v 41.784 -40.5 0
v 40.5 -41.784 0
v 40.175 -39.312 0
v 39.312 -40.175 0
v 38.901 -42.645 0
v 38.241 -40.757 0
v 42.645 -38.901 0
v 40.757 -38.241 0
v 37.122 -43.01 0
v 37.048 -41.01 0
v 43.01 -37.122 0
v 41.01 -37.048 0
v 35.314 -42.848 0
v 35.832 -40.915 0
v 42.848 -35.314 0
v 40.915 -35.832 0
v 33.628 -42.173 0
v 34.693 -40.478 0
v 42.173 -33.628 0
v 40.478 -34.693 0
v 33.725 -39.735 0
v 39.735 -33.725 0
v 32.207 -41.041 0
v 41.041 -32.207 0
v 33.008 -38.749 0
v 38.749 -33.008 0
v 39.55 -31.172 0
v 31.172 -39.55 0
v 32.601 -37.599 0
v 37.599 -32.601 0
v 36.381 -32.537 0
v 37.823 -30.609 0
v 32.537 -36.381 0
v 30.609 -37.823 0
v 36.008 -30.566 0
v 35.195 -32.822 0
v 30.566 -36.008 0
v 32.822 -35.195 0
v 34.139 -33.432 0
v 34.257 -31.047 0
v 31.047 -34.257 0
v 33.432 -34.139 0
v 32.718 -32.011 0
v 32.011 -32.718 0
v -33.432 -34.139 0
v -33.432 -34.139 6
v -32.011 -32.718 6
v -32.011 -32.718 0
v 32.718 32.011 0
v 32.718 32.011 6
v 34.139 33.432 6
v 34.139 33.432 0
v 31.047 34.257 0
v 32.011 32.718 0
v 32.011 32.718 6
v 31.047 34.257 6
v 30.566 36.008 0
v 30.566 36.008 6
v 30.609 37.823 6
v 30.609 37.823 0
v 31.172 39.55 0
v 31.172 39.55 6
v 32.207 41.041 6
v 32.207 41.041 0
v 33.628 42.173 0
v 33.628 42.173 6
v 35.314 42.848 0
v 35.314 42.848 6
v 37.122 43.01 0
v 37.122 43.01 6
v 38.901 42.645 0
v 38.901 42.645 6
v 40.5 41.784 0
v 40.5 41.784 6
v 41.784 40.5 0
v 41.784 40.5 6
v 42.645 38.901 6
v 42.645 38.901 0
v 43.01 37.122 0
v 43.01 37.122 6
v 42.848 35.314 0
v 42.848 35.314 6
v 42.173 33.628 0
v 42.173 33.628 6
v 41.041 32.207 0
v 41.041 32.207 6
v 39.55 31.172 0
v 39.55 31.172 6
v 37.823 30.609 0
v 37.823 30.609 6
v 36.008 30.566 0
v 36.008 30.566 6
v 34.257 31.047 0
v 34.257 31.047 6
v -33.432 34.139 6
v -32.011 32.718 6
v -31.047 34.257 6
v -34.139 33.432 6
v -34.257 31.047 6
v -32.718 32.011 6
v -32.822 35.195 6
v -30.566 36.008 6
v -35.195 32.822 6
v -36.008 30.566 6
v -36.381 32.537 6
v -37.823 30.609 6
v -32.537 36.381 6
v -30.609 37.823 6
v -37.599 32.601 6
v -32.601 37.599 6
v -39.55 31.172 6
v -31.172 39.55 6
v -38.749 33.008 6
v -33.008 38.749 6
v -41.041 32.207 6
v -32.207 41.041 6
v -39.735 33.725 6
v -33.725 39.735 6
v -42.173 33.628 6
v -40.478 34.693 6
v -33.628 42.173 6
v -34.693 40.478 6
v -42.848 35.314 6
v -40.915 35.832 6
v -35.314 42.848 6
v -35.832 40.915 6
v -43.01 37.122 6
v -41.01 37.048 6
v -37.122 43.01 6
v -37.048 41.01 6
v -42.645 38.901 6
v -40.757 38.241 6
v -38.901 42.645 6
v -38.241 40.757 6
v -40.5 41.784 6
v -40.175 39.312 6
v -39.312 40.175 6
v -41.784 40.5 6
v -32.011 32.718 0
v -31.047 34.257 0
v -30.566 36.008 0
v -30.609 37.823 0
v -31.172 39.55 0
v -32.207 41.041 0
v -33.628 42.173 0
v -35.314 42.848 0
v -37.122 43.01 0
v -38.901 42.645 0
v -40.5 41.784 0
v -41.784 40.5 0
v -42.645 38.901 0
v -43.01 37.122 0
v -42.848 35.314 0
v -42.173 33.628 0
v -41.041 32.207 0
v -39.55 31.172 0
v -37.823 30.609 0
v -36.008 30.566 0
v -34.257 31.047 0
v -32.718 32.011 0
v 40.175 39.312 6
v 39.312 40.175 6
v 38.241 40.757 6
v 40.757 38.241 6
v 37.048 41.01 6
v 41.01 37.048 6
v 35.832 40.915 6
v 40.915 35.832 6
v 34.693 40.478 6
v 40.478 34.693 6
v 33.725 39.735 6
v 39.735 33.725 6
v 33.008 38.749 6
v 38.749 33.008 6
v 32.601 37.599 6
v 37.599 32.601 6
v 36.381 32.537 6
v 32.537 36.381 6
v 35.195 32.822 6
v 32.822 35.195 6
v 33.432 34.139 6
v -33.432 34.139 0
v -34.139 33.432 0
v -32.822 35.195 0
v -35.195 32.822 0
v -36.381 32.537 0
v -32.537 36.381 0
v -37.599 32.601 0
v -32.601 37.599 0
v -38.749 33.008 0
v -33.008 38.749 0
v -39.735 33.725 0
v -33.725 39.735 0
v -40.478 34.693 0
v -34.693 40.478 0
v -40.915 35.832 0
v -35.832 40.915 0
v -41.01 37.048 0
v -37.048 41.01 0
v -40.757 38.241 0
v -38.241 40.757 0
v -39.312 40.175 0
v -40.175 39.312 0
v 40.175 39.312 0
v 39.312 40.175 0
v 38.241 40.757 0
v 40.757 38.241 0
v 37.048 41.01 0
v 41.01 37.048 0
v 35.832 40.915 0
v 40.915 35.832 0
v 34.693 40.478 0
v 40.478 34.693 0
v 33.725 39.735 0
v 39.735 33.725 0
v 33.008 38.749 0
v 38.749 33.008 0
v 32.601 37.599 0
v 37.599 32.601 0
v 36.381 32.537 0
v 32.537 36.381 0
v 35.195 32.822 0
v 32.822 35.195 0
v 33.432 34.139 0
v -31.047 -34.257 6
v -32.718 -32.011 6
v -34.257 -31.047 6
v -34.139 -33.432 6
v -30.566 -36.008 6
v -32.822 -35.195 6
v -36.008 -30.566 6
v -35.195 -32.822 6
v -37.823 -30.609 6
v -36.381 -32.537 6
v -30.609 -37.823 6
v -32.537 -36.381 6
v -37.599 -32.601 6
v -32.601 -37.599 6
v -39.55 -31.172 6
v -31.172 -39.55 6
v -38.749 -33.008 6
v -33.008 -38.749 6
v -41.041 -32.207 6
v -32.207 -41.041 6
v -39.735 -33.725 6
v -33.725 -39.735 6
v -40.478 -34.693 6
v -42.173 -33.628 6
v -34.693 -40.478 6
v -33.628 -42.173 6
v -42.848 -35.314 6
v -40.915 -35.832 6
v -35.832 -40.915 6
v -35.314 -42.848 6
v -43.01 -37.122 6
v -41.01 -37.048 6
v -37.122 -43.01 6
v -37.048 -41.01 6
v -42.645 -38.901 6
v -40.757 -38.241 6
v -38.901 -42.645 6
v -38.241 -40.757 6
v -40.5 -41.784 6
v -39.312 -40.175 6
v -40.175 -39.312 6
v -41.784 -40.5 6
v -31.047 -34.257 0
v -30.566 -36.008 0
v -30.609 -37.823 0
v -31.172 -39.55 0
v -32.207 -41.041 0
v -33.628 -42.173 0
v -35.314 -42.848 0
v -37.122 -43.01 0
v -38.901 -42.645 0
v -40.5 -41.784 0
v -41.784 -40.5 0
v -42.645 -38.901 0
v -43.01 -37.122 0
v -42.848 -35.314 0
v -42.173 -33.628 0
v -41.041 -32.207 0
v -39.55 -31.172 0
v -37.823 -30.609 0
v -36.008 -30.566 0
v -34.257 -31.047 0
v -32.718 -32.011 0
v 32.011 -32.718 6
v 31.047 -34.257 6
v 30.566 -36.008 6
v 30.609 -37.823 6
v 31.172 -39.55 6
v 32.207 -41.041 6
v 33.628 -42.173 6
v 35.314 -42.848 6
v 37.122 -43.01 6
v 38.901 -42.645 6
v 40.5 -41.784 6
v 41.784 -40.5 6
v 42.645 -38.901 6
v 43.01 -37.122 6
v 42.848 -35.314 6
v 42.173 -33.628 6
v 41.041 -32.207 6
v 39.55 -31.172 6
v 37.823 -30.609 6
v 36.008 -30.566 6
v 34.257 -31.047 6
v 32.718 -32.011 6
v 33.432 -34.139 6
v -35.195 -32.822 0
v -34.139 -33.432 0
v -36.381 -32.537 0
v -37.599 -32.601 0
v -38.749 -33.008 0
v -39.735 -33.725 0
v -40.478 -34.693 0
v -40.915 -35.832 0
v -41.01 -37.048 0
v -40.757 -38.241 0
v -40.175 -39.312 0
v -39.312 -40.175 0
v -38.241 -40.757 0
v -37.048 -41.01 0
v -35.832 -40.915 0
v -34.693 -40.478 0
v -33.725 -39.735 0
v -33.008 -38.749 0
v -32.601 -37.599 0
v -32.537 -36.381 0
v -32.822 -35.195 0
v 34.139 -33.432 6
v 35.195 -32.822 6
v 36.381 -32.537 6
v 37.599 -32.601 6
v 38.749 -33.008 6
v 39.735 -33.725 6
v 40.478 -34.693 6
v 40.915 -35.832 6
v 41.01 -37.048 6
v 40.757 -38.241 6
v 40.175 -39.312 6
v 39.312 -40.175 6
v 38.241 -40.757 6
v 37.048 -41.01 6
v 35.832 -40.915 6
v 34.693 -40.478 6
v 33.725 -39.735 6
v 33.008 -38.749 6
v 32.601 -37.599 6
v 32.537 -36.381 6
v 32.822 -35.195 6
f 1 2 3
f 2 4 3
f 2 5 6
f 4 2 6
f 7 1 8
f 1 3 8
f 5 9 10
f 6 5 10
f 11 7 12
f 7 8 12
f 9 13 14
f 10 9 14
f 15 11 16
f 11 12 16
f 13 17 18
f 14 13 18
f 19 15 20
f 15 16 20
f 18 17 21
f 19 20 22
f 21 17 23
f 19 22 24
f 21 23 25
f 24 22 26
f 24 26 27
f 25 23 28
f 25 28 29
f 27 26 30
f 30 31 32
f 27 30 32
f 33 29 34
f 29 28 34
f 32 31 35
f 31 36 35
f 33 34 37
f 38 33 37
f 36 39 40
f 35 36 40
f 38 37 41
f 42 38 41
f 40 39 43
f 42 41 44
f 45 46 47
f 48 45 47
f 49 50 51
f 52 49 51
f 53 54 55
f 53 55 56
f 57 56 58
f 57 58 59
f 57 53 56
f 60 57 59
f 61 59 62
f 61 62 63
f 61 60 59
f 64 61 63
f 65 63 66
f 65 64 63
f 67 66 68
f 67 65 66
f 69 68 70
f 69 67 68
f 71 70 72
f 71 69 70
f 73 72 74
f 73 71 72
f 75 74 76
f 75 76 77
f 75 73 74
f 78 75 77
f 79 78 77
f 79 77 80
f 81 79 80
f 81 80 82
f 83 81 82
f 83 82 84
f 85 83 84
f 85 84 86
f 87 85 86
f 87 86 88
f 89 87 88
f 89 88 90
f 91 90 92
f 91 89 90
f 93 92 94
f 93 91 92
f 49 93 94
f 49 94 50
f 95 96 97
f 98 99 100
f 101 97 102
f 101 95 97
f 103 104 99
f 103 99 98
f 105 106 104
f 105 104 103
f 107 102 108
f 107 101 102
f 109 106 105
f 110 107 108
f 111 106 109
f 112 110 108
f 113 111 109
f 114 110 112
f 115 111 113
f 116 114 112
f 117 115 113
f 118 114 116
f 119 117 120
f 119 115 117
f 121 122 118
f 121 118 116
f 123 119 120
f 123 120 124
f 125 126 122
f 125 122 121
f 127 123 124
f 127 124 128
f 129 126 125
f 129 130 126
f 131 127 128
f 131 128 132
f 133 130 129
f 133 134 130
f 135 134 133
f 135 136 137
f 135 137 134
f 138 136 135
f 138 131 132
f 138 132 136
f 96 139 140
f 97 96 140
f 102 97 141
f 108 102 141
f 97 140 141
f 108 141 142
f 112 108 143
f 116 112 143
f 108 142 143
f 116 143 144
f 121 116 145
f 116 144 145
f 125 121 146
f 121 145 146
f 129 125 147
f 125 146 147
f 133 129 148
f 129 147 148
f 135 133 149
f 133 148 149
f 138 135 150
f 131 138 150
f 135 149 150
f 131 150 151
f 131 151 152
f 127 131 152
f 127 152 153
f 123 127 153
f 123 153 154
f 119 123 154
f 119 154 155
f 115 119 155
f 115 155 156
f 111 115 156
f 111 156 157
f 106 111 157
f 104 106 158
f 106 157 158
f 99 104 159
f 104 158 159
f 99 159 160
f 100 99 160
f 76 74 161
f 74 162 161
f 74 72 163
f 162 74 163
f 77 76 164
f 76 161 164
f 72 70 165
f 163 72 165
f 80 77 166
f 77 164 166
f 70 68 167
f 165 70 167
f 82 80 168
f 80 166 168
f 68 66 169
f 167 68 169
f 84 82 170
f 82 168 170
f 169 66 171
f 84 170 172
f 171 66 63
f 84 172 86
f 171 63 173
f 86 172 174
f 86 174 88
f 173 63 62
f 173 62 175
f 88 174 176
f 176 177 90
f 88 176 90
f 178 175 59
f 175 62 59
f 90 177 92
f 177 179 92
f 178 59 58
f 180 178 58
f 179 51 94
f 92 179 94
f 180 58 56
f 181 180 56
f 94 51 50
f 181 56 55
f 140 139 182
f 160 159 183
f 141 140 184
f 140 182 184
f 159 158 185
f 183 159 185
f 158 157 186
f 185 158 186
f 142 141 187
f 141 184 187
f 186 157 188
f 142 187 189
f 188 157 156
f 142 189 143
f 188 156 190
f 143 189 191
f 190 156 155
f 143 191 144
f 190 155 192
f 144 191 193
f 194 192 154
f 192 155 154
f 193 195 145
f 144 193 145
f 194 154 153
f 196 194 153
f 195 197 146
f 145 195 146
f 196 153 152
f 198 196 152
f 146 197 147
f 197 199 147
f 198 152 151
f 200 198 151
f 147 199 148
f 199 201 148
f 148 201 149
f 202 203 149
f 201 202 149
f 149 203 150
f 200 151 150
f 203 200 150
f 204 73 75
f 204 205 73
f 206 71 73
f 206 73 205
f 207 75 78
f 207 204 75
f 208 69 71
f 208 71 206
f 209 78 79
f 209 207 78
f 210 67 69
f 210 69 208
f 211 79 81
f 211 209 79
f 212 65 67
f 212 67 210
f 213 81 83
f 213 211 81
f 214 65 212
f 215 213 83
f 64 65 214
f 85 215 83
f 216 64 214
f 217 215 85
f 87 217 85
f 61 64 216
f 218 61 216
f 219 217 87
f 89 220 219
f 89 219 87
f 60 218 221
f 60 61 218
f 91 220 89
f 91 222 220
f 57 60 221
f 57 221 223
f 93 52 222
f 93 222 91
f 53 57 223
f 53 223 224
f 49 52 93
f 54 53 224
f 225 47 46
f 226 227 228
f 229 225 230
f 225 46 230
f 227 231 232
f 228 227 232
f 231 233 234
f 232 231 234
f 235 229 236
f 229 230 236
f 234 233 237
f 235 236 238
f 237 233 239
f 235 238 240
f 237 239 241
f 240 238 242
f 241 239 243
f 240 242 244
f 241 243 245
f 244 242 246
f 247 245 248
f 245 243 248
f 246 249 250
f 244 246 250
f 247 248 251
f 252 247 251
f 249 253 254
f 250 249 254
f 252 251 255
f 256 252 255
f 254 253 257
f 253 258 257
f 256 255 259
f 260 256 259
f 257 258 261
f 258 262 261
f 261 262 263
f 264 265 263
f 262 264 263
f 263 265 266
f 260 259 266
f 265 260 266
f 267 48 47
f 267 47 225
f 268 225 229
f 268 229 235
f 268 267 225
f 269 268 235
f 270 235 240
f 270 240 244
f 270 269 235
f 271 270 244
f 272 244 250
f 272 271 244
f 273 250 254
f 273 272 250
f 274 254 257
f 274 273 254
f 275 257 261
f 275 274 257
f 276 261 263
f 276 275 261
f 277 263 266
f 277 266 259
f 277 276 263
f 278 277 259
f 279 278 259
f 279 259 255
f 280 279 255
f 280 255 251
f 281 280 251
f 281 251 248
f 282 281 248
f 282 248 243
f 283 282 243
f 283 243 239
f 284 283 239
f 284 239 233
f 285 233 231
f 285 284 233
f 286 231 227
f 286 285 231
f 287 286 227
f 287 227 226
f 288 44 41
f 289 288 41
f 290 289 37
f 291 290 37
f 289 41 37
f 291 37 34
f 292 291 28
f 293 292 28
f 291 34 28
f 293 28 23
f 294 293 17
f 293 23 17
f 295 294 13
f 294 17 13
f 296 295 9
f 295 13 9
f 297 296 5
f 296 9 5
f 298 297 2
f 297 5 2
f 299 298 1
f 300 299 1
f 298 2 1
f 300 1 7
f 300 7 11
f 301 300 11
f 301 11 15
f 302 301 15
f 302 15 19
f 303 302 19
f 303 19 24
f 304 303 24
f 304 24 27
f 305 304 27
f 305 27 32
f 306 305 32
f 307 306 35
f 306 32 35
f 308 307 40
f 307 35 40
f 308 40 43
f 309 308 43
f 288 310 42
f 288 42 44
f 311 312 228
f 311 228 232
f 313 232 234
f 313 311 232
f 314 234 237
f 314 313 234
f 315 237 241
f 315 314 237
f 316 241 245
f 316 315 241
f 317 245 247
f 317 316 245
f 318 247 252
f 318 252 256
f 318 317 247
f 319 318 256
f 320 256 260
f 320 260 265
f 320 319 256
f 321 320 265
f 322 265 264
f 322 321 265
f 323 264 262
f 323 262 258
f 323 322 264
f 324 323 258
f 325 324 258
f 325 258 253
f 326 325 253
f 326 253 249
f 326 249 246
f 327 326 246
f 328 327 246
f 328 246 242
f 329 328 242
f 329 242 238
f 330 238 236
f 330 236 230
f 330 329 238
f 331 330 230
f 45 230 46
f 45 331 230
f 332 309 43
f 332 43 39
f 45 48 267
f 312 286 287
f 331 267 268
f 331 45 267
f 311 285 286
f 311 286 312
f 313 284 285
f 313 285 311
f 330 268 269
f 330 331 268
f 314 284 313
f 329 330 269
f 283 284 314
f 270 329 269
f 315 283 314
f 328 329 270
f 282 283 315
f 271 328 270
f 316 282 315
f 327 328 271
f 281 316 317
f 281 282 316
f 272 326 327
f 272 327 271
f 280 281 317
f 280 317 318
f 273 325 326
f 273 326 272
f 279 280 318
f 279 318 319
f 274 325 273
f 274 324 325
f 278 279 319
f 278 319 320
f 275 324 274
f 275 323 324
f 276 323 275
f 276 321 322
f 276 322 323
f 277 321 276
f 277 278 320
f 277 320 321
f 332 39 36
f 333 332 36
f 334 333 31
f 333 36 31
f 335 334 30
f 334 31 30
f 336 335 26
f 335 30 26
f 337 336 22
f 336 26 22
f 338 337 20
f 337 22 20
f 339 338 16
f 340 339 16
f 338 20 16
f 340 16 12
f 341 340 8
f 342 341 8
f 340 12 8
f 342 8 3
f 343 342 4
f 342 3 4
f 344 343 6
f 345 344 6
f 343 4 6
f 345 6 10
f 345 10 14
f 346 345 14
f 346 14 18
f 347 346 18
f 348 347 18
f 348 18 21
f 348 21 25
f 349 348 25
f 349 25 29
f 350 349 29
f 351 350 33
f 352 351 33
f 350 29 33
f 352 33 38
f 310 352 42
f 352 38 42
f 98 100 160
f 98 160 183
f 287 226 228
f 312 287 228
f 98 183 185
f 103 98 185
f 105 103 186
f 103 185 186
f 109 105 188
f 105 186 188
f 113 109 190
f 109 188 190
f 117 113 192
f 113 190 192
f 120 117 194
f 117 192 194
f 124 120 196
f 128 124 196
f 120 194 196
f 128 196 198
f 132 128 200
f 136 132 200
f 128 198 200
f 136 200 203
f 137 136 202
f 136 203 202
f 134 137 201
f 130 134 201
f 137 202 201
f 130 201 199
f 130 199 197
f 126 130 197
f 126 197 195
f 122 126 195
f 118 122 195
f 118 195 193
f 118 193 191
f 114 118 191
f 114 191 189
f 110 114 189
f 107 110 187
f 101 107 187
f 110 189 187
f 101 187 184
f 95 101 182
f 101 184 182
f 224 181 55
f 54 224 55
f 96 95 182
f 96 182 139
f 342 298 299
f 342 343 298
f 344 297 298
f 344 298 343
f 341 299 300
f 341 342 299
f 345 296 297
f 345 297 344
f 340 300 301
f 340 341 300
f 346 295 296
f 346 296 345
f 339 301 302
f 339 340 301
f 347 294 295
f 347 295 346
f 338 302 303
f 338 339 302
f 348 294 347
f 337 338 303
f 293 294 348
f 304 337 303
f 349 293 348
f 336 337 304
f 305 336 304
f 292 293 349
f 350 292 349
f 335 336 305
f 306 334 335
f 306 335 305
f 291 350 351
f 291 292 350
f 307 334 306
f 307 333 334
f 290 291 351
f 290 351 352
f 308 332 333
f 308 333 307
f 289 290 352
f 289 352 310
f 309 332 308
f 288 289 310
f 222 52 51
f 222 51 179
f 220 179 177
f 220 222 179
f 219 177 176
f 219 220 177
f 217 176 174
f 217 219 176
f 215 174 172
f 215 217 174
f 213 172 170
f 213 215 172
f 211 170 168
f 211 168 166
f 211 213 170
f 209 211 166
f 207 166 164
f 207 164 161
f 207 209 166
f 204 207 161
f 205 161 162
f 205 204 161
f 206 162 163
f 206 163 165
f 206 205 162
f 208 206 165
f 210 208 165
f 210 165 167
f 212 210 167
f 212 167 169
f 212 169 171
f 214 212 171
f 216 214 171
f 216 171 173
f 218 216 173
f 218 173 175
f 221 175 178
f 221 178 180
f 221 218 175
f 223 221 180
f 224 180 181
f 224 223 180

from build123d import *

# Parameters (mm, degrees)
EXTRUDE_DEPTH    = 6
EXTRUDE001_DEPTH = 6
EXTRUDE002_DEPTH = 6
EXTRUDE003_DEPTH = 6


with BuildPart() as extrude_body:
    # Face → Extrude (new body)
    with BuildSketch(Plane(origin=(-36.885616, 36.885616, 0), x_dir=(0, 1, 0), z_dir=(0, 0, 1))):
        with BuildLine():
            Line((-2.746844, -3.453951), (-4.167763, -4.87487))
            ThreePointArc((-4.167763, -4.87487), (4.303354, 4.303354), (-4.87487, -4.167763))
            Line((-4.87487, -4.167763), (-3.453951, -2.746844))
            ThreePointArc((-3.453951, -2.746844), (2.88914, 2.88914), (-2.746844, -3.453951))
        make_face()
    extrude(amount=EXTRUDE_DEPTH)


with BuildPart() as extrude001:
    # Face001 → Extrude001 (new body)
    with BuildSketch(Plane(origin=(36.885616, 36.885616, 0), x_dir=(0, -1, 0), z_dir=(0, 0, -1))):
        with BuildLine():
            Line((2.746844, 3.453951), (4.167763, 4.87487))
            ThreePointArc((4.167763, 4.87487), (-4.303354, -4.303354), (4.87487, 4.167763))
            Line((4.87487, 4.167763), (3.453951, 2.746844))
            ThreePointArc((3.453951, 2.746844), (-2.88914, -2.88914), (2.746844, 3.453951))
        make_face()
    extrude(amount=-EXTRUDE001_DEPTH)


with BuildPart() as extrude002:
    # Face002 → Extrude002 (new body)
    with BuildSketch(Plane(origin=(36.885616, -36.885616, 0), x_dir=(0, 1, 0), z_dir=(0, 0, 1))):
        with BuildLine():
            Line((2.746844, 3.453951), (4.167763, 4.87487))
            ThreePointArc((4.167763, 4.87487), (-4.303354, -4.303354), (4.87487, 4.167763))
            Line((4.87487, 4.167763), (3.453951, 2.746844))
            ThreePointArc((3.453951, 2.746844), (-2.88914, -2.88914), (2.746844, 3.453951))
        make_face()
    extrude(amount=EXTRUDE002_DEPTH)


with BuildPart() as extrude003:
    # Face003 → Extrude003 (new body)
    with BuildSketch(Plane(origin=(-36.885616, -36.885616, 0), x_dir=(0, -1, 0), z_dir=(0, 0, -1))):
        with BuildLine():
            Line((-2.746844, -3.453951), (-4.167763, -4.87487))
            ThreePointArc((-4.167763, -4.87487), (4.303354, 4.303354), (-4.87487, -4.167763))
            Line((-4.87487, -4.167763), (-3.453951, -2.746844))
            ThreePointArc((-3.453951, -2.746844), (2.88914, 2.88914), (-2.746844, -3.453951))
        make_face()
    extrude(amount=-EXTRUDE003_DEPTH)


solid = Compound([extrude_body.part, extrude001.part, extrude002.part, extrude003.part])
